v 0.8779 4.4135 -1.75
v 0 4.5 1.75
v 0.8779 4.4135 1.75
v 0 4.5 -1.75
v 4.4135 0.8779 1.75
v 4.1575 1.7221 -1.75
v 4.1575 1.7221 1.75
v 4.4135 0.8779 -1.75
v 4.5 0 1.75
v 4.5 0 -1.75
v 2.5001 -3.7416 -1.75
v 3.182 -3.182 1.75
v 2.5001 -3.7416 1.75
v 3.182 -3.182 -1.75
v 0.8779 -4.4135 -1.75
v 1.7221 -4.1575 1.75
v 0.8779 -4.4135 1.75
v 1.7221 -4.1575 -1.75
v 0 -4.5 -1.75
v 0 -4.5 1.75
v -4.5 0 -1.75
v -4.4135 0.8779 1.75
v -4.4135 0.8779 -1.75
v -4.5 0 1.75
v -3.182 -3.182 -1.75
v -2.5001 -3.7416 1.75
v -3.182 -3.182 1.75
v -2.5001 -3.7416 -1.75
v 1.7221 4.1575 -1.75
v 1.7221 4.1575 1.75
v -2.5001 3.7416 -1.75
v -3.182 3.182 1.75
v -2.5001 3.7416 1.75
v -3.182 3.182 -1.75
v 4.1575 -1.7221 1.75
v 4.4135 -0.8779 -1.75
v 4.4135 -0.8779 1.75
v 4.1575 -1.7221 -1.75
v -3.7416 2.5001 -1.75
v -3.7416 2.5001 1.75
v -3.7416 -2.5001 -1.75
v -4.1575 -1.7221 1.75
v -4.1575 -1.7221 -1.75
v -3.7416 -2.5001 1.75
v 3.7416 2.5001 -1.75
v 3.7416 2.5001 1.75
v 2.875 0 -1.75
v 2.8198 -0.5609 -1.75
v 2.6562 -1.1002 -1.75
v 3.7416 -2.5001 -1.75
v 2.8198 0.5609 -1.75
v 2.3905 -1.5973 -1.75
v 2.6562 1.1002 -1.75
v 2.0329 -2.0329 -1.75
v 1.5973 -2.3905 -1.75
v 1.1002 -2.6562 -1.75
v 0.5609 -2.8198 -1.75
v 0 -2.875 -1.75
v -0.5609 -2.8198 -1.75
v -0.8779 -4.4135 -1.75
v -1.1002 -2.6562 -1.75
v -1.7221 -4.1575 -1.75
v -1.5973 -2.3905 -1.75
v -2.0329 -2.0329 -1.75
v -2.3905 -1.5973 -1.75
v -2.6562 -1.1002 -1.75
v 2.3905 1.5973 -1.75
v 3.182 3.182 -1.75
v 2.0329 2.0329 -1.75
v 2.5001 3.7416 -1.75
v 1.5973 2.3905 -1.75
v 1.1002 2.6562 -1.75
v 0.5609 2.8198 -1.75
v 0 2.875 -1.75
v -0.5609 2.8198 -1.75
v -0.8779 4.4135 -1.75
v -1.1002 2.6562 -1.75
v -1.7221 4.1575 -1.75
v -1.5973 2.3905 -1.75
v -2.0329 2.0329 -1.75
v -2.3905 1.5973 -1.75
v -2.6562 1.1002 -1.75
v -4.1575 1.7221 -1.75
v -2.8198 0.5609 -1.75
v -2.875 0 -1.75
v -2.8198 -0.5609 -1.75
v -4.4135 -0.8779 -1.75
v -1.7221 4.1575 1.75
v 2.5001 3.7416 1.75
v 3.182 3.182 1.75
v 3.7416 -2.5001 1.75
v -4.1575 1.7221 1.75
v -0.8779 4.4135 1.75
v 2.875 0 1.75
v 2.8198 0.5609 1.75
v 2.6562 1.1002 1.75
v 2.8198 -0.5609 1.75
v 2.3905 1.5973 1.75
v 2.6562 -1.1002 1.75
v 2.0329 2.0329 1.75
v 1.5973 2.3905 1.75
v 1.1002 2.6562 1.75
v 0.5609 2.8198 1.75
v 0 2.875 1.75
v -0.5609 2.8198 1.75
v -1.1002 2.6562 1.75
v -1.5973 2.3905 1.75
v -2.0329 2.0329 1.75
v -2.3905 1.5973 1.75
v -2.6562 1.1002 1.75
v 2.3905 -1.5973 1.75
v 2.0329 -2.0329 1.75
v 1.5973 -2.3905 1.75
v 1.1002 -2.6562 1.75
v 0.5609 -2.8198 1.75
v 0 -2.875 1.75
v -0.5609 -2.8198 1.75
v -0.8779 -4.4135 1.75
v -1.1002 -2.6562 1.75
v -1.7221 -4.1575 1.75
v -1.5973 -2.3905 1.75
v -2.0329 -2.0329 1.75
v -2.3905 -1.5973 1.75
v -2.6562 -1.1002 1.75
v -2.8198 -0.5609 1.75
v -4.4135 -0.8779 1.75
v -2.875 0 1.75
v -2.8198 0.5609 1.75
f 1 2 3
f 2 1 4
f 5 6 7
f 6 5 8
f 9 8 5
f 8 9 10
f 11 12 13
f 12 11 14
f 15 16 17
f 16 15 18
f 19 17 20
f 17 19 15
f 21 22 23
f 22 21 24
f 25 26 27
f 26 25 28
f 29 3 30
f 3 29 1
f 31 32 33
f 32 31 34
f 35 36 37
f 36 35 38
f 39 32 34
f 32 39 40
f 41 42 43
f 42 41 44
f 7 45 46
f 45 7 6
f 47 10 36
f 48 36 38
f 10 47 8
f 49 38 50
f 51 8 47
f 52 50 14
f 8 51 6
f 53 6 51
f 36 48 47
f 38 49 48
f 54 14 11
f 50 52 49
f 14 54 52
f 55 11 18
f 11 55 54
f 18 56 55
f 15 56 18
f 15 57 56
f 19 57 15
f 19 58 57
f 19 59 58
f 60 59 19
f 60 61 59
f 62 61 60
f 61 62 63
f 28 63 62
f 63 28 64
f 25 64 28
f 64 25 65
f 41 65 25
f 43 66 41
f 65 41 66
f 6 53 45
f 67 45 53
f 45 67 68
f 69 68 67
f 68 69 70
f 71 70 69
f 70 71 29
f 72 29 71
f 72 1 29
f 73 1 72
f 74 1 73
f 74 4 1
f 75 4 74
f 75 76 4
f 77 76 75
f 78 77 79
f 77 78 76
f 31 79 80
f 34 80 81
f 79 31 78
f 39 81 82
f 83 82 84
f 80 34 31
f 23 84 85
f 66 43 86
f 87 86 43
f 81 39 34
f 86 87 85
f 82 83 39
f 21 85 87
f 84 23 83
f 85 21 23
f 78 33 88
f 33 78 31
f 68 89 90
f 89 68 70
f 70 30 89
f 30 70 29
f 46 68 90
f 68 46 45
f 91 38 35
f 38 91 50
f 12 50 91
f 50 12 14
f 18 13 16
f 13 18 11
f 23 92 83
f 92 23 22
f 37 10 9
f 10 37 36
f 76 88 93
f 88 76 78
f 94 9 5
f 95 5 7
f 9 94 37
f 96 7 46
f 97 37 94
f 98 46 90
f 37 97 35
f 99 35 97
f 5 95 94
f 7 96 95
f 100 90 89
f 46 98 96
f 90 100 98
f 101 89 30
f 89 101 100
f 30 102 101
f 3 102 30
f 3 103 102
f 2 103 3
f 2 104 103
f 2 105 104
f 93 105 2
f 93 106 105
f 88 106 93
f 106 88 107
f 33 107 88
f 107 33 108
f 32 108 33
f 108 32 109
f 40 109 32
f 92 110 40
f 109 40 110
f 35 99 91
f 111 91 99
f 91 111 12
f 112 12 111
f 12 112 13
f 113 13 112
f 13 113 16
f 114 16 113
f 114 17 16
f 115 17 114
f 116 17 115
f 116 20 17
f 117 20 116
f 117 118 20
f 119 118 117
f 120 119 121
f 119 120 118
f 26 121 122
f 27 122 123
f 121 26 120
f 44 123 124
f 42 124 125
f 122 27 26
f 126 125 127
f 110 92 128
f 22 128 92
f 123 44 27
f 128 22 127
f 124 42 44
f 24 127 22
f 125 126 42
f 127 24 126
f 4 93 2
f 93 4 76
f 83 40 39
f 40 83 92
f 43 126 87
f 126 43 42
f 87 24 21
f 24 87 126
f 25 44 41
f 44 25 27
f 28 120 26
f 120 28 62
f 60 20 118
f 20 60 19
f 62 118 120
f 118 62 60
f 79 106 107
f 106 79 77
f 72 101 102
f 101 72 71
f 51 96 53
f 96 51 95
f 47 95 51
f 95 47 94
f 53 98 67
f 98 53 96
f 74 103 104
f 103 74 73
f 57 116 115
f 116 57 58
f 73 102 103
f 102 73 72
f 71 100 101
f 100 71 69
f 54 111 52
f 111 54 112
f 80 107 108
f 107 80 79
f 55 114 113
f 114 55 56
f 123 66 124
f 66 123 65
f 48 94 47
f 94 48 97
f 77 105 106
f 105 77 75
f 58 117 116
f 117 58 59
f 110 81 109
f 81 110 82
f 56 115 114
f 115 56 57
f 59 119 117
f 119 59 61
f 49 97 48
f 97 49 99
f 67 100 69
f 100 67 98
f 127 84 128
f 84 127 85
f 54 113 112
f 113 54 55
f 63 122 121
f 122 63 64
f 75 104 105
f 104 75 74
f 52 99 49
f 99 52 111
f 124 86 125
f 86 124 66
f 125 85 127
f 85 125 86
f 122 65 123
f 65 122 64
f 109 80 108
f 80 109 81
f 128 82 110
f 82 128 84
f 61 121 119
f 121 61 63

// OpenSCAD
$fn = 32;

// options
middle = false;

// constants
inner = 5.75;
outer = 9;
height = middle ? 6 : 3.5;

difference() {
  cylinder(d=outer, h=height, center=true);
  cylinder(d=inner, h=height, center=true);
}
